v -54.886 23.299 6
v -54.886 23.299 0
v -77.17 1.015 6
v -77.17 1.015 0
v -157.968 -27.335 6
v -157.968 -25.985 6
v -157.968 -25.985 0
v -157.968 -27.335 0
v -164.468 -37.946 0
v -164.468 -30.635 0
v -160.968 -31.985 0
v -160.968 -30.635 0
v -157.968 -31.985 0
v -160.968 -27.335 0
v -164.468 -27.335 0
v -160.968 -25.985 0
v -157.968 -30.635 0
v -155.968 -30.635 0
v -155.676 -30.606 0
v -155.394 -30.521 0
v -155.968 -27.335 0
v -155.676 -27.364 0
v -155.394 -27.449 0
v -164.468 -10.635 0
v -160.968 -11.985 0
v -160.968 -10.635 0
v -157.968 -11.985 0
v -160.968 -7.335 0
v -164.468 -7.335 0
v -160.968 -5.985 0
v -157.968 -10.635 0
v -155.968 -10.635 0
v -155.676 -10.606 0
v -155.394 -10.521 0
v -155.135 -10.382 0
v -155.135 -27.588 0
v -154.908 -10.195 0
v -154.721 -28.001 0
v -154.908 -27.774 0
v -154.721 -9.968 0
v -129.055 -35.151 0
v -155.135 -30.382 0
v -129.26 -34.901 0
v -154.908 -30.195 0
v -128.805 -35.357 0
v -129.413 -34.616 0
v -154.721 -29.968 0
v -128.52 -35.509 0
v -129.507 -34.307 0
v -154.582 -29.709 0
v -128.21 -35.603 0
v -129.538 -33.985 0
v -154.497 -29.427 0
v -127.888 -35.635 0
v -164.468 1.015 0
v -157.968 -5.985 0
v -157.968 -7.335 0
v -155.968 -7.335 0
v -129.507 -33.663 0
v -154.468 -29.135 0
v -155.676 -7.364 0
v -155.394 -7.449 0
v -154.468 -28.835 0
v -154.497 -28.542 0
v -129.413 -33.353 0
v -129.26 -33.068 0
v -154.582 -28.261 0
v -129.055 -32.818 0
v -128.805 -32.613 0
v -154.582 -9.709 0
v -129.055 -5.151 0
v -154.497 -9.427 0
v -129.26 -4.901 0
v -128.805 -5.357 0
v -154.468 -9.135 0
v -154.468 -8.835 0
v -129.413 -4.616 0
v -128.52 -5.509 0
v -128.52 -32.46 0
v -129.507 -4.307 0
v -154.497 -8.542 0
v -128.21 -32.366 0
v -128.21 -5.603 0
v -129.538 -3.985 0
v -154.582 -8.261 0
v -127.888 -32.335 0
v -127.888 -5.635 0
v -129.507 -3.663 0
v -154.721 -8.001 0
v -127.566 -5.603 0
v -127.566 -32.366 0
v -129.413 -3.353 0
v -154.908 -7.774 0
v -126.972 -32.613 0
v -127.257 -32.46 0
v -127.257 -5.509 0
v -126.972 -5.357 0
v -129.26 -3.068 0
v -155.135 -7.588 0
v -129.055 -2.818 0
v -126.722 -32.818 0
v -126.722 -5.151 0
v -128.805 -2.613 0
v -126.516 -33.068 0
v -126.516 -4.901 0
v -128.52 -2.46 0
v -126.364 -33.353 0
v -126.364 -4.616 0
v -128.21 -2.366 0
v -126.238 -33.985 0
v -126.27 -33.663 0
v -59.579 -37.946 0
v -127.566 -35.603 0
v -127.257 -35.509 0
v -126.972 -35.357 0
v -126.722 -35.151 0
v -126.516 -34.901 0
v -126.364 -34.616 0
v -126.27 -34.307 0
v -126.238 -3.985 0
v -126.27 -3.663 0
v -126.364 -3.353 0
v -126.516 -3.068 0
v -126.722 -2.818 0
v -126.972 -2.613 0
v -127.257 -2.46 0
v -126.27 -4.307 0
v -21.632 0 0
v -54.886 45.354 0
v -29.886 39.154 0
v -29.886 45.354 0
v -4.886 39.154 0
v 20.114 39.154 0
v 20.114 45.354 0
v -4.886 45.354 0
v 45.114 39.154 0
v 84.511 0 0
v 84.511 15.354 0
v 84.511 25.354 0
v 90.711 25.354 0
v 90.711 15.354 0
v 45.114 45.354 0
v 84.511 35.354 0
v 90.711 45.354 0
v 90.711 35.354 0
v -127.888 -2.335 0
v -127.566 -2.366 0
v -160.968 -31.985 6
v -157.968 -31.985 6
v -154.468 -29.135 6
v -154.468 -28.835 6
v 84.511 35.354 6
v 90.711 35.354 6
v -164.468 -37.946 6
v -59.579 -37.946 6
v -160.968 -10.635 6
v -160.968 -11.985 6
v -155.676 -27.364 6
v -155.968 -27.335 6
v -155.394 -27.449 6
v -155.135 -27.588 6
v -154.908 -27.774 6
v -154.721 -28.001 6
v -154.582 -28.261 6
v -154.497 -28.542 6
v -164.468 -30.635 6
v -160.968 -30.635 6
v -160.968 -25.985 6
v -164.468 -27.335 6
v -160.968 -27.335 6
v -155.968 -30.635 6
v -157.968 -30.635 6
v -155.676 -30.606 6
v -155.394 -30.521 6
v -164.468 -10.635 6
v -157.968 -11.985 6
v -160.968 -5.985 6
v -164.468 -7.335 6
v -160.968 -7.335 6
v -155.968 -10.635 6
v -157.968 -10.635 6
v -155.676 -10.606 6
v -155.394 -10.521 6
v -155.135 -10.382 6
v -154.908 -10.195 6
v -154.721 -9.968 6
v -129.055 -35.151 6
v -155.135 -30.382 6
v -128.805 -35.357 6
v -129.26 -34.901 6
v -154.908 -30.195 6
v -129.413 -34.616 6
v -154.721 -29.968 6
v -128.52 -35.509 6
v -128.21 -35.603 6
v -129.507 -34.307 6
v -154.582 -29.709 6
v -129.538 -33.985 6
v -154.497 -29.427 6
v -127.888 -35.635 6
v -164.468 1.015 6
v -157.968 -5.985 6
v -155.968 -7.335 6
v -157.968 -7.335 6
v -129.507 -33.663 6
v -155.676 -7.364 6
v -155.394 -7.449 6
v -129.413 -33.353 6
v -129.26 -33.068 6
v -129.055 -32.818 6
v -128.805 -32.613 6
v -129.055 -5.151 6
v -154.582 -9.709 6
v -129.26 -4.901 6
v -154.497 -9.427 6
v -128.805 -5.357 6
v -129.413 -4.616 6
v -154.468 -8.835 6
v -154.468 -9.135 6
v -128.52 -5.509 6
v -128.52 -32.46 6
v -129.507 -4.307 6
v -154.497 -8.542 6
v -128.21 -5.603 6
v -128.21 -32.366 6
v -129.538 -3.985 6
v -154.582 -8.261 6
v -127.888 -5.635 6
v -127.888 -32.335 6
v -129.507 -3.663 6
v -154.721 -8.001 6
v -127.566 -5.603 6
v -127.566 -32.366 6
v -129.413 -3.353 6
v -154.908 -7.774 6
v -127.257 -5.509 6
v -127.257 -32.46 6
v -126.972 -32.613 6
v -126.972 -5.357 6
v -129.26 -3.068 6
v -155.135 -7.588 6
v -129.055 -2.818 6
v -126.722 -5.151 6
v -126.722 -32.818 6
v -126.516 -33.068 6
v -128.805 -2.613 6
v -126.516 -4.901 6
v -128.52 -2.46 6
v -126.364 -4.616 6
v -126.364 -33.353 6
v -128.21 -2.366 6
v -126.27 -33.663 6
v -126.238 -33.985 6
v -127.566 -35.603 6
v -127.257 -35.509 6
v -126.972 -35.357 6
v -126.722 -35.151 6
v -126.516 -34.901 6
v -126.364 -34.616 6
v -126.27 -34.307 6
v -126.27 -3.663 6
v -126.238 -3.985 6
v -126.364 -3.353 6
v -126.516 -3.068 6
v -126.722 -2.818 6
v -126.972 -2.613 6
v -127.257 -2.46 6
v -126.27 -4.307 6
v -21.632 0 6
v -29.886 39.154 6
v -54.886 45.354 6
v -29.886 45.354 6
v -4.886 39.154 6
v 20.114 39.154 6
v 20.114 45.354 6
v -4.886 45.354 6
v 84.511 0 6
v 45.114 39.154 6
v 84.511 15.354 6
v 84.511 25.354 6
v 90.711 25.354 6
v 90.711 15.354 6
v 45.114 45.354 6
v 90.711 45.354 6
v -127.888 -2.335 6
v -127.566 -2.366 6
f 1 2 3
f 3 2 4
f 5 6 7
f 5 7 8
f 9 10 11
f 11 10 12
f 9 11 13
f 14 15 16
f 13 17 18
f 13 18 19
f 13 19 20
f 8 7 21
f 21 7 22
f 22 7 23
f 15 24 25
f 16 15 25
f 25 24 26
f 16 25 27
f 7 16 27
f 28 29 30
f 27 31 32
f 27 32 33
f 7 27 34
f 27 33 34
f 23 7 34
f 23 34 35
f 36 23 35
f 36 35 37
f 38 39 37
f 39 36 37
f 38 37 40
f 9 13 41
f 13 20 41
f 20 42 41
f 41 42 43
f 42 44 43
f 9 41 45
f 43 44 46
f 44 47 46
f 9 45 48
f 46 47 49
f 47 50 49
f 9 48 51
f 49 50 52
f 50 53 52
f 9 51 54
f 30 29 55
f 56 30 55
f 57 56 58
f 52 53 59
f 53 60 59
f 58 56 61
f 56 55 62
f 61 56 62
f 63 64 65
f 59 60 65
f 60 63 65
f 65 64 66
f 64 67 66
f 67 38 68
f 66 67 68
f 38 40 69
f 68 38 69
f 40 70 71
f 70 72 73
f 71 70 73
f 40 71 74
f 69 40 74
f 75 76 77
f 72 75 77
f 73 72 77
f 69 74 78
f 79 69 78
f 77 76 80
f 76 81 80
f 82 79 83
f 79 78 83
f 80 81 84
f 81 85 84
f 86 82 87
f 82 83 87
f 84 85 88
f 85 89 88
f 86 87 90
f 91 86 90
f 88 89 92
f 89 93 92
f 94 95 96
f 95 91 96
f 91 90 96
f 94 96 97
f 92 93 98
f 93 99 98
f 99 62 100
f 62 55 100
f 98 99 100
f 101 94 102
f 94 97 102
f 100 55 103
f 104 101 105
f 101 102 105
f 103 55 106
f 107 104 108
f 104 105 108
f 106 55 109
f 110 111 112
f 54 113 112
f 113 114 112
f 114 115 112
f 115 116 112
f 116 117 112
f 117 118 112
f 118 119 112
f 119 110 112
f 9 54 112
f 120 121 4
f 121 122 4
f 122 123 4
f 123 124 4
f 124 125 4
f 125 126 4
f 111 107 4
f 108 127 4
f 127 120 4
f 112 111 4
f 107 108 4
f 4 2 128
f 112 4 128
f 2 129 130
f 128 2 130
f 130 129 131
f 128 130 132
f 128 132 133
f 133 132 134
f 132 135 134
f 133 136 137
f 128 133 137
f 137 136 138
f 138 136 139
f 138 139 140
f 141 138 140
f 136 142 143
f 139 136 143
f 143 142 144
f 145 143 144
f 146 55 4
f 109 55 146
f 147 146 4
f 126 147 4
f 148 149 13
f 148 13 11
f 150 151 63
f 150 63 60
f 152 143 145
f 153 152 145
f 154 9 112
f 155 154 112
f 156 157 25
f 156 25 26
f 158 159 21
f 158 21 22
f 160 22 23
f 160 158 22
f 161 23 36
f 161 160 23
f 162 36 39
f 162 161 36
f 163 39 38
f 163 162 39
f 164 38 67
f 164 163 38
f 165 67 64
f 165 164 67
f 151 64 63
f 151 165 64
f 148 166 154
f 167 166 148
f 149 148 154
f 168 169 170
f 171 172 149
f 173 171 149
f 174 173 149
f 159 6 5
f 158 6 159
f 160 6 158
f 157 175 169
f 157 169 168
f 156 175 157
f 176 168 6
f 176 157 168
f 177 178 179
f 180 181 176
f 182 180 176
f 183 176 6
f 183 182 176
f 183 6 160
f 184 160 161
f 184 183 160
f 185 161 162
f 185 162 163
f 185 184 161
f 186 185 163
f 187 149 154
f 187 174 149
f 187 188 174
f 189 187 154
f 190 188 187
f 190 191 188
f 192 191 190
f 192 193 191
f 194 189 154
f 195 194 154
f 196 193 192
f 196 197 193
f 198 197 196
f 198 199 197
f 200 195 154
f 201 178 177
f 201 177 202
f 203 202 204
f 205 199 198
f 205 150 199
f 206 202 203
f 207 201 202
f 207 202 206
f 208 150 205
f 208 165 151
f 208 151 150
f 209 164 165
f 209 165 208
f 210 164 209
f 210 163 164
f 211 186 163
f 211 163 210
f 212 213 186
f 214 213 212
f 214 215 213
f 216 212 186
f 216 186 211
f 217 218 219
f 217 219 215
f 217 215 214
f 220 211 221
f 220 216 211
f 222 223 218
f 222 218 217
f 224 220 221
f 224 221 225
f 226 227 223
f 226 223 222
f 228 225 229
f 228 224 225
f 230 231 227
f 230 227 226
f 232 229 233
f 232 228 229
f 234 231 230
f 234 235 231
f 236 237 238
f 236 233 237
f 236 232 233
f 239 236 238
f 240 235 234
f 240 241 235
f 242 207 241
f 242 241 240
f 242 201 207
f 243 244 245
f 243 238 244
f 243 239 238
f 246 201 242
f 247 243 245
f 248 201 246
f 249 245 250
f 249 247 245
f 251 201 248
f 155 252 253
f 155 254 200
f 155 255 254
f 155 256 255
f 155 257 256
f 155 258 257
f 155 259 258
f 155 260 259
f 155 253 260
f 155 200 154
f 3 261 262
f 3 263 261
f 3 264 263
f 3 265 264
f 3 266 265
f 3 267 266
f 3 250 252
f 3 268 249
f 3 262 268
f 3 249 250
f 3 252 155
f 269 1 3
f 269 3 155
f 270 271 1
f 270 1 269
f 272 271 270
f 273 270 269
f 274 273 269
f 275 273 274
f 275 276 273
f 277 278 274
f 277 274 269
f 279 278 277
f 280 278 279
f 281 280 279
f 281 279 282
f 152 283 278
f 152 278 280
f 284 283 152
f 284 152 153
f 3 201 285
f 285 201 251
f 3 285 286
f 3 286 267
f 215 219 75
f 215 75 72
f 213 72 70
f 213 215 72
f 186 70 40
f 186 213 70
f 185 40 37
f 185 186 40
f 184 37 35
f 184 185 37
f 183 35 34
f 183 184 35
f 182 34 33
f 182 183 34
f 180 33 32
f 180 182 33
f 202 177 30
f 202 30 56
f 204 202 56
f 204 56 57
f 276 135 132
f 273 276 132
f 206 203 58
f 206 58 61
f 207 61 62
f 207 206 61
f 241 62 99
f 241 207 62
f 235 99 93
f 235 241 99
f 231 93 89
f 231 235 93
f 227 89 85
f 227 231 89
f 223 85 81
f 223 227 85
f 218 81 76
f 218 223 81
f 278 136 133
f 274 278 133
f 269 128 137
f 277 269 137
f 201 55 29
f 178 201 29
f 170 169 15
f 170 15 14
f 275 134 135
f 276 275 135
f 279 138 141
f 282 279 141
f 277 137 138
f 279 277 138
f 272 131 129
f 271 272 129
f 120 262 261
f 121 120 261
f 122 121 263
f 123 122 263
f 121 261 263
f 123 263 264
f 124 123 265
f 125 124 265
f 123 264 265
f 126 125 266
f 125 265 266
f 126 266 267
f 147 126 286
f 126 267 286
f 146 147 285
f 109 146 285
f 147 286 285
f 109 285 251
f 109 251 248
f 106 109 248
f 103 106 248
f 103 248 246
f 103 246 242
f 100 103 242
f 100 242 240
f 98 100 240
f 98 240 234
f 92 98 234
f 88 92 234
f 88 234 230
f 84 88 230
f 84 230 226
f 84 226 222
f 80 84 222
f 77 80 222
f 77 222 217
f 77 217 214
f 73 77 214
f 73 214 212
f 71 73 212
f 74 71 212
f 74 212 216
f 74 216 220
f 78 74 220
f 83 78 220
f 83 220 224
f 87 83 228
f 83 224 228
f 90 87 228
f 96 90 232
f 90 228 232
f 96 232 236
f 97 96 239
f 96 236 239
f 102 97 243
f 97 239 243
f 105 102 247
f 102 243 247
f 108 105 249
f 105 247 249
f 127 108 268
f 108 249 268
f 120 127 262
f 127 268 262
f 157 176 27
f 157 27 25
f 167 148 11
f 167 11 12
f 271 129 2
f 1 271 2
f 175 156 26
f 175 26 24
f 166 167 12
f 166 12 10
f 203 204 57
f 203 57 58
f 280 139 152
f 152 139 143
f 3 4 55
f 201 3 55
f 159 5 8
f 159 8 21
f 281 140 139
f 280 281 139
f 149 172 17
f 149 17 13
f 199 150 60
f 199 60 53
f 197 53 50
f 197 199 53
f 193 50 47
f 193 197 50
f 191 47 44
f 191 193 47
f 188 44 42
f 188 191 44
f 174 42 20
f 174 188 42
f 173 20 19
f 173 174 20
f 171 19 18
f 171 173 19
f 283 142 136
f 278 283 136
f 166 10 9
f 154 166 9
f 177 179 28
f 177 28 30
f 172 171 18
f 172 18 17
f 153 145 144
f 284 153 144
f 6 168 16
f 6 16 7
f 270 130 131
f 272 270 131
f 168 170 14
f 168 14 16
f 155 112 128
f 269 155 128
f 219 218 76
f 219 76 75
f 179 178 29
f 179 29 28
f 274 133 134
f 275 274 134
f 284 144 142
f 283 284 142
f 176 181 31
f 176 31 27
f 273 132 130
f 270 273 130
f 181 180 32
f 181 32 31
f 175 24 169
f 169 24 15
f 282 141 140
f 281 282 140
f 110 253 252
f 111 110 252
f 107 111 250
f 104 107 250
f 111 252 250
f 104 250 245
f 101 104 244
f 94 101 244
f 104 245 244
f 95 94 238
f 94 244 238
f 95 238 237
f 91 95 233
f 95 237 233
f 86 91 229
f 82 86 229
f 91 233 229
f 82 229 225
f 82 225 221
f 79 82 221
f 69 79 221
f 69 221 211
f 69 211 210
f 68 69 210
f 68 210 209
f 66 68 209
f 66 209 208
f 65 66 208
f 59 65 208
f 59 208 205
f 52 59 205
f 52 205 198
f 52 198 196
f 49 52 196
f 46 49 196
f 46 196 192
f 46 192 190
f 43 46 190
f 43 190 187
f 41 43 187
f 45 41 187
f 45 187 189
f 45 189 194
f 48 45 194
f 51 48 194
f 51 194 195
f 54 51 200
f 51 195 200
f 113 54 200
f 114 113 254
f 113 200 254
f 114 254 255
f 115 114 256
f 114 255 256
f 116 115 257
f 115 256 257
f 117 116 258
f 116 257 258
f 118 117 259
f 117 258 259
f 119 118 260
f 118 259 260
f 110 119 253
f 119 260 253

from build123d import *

# Parameters (mm, degrees)
EXTRUDE_1_DEPTH     = 6
SKETCH_2_R          = 1.65
CUT_EXTRUDE_1_DEPTH = 171.71260254


with BuildPart() as part:
    # Эскиз1 → Бобышка-Вытянуть1 (new body)
    with BuildSketch(Plane.XY):
        Polygon((-164.468308742, 1.015256317), (-164.468308742, -37.946418867), (-59.578582118, -37.946418867), (-21.632163251, 0), (84.510530021, 0), (84.510530021, 15.353810043), (90.710530021, 15.353810043), (90.710530021, 25.353810043), (84.510530021, 25.353810043), (84.510530021, 35.353810043), (90.710530021, 35.353810043), (90.710530021, 45.353810043), (45.113947205, 45.353810043), (45.113947205, 39.153810043), (20.113947205, 39.153810043), (20.113947205, 45.353810043), (-4.886052795, 45.353810043), (-4.886052795, 39.153810043), (-29.886052795, 39.153810043), (-29.886052795, 45.353810043), (-54.886052795, 45.353810043), (-54.886052795, 23.298924803), (-77.169721281, 1.015256317), align=None)
    extrude(amount=EXTRUDE_1_DEPTH)

    # Эскиз2 → Вырез-Вытянуть1 (cut, through all)
    with BuildSketch(Plane.XY.offset(6)):
        with Locations((-127.888308742, -3.984743683)):
            Circle(SKETCH_2_R)
        with Locations((-127.888308742, -33.984743683)):
            Circle(SKETCH_2_R)
        with BuildLine():
            Line((-157.968308742, -10.634743683), (-157.968308742, -11.984743683))
            Line((-157.968308742, -11.984743683), (-160.968308742, -11.984743683))
            Line((-160.968308742, -11.984743683), (-160.968308742, -10.634743683))
            Line((-160.968308742, -10.634743683), (-164.468308742, -10.634743683))
            Line((-164.468308742, -10.634743683), (-164.468308742, -7.334743683))
            Line((-164.468308742, -7.334743683), (-160.968308742, -7.334743683))
            Line((-160.968308742, -7.334743683), (-160.968308742, -5.984743683))
            Line((-160.968308742, -5.984743683), (-157.968308742, -5.984743683))
            Line((-157.968308742, -5.984743683), (-157.968308742, -7.334743683))
            Line((-157.968308742, -7.334743683), (-155.968308742, -7.334743683))
            ThreePointArc((-155.968308742, -7.334743683), (-154.90764857, -7.774083512), (-154.468308742, -8.834743683))
            Line((-154.468308742, -8.834743683), (-154.468308742, -9.134743683))
            ThreePointArc((-154.468308742, -9.134743683), (-154.90764857, -10.195403855), (-155.968308742, -10.634743683))
            Line((-155.968308742, -10.634743683), (-157.968308742, -10.634743683))
        make_face()
        with BuildLine():
            Line((-160.968308742, -25.984743683), (-157.968308742, -25.984743683))
            Line((-157.968308742, -25.984743683), (-157.968308742, -27.334743683))
            Line((-157.968308742, -27.334743683), (-155.968308742, -27.334743683))
            ThreePointArc((-155.968308742, -27.334743683), (-154.90764857, -27.774083512), (-154.468308742, -28.834743683))
            Line((-154.468308742, -28.834743683), (-154.468308742, -29.134743683))
            ThreePointArc((-154.468308742, -29.134743683), (-154.90764857, -30.195403855), (-155.968308742, -30.634743683))
            Line((-155.968308742, -30.634743683), (-157.968308742, -30.634743683))
            Line((-157.968308742, -30.634743683), (-157.968308742, -31.984743683))
            Line((-157.968308742, -31.984743683), (-160.968308742, -31.984743683))
            Line((-160.968308742, -31.984743683), (-160.968308742, -30.634743683))
            Line((-160.968308742, -30.634743683), (-164.468308742, -30.634743683))
            Line((-164.468308742, -30.634743683), (-164.468308742, -27.334743683))
            Line((-164.468308742, -27.334743683), (-160.968308742, -27.334743683))
            Line((-160.968308742, -27.334743683), (-160.968308742, -25.984743683))
        make_face()
    extrude(amount=-CUT_EXTRUDE_1_DEPTH, mode=Mode.SUBTRACT)


solid = part.part
